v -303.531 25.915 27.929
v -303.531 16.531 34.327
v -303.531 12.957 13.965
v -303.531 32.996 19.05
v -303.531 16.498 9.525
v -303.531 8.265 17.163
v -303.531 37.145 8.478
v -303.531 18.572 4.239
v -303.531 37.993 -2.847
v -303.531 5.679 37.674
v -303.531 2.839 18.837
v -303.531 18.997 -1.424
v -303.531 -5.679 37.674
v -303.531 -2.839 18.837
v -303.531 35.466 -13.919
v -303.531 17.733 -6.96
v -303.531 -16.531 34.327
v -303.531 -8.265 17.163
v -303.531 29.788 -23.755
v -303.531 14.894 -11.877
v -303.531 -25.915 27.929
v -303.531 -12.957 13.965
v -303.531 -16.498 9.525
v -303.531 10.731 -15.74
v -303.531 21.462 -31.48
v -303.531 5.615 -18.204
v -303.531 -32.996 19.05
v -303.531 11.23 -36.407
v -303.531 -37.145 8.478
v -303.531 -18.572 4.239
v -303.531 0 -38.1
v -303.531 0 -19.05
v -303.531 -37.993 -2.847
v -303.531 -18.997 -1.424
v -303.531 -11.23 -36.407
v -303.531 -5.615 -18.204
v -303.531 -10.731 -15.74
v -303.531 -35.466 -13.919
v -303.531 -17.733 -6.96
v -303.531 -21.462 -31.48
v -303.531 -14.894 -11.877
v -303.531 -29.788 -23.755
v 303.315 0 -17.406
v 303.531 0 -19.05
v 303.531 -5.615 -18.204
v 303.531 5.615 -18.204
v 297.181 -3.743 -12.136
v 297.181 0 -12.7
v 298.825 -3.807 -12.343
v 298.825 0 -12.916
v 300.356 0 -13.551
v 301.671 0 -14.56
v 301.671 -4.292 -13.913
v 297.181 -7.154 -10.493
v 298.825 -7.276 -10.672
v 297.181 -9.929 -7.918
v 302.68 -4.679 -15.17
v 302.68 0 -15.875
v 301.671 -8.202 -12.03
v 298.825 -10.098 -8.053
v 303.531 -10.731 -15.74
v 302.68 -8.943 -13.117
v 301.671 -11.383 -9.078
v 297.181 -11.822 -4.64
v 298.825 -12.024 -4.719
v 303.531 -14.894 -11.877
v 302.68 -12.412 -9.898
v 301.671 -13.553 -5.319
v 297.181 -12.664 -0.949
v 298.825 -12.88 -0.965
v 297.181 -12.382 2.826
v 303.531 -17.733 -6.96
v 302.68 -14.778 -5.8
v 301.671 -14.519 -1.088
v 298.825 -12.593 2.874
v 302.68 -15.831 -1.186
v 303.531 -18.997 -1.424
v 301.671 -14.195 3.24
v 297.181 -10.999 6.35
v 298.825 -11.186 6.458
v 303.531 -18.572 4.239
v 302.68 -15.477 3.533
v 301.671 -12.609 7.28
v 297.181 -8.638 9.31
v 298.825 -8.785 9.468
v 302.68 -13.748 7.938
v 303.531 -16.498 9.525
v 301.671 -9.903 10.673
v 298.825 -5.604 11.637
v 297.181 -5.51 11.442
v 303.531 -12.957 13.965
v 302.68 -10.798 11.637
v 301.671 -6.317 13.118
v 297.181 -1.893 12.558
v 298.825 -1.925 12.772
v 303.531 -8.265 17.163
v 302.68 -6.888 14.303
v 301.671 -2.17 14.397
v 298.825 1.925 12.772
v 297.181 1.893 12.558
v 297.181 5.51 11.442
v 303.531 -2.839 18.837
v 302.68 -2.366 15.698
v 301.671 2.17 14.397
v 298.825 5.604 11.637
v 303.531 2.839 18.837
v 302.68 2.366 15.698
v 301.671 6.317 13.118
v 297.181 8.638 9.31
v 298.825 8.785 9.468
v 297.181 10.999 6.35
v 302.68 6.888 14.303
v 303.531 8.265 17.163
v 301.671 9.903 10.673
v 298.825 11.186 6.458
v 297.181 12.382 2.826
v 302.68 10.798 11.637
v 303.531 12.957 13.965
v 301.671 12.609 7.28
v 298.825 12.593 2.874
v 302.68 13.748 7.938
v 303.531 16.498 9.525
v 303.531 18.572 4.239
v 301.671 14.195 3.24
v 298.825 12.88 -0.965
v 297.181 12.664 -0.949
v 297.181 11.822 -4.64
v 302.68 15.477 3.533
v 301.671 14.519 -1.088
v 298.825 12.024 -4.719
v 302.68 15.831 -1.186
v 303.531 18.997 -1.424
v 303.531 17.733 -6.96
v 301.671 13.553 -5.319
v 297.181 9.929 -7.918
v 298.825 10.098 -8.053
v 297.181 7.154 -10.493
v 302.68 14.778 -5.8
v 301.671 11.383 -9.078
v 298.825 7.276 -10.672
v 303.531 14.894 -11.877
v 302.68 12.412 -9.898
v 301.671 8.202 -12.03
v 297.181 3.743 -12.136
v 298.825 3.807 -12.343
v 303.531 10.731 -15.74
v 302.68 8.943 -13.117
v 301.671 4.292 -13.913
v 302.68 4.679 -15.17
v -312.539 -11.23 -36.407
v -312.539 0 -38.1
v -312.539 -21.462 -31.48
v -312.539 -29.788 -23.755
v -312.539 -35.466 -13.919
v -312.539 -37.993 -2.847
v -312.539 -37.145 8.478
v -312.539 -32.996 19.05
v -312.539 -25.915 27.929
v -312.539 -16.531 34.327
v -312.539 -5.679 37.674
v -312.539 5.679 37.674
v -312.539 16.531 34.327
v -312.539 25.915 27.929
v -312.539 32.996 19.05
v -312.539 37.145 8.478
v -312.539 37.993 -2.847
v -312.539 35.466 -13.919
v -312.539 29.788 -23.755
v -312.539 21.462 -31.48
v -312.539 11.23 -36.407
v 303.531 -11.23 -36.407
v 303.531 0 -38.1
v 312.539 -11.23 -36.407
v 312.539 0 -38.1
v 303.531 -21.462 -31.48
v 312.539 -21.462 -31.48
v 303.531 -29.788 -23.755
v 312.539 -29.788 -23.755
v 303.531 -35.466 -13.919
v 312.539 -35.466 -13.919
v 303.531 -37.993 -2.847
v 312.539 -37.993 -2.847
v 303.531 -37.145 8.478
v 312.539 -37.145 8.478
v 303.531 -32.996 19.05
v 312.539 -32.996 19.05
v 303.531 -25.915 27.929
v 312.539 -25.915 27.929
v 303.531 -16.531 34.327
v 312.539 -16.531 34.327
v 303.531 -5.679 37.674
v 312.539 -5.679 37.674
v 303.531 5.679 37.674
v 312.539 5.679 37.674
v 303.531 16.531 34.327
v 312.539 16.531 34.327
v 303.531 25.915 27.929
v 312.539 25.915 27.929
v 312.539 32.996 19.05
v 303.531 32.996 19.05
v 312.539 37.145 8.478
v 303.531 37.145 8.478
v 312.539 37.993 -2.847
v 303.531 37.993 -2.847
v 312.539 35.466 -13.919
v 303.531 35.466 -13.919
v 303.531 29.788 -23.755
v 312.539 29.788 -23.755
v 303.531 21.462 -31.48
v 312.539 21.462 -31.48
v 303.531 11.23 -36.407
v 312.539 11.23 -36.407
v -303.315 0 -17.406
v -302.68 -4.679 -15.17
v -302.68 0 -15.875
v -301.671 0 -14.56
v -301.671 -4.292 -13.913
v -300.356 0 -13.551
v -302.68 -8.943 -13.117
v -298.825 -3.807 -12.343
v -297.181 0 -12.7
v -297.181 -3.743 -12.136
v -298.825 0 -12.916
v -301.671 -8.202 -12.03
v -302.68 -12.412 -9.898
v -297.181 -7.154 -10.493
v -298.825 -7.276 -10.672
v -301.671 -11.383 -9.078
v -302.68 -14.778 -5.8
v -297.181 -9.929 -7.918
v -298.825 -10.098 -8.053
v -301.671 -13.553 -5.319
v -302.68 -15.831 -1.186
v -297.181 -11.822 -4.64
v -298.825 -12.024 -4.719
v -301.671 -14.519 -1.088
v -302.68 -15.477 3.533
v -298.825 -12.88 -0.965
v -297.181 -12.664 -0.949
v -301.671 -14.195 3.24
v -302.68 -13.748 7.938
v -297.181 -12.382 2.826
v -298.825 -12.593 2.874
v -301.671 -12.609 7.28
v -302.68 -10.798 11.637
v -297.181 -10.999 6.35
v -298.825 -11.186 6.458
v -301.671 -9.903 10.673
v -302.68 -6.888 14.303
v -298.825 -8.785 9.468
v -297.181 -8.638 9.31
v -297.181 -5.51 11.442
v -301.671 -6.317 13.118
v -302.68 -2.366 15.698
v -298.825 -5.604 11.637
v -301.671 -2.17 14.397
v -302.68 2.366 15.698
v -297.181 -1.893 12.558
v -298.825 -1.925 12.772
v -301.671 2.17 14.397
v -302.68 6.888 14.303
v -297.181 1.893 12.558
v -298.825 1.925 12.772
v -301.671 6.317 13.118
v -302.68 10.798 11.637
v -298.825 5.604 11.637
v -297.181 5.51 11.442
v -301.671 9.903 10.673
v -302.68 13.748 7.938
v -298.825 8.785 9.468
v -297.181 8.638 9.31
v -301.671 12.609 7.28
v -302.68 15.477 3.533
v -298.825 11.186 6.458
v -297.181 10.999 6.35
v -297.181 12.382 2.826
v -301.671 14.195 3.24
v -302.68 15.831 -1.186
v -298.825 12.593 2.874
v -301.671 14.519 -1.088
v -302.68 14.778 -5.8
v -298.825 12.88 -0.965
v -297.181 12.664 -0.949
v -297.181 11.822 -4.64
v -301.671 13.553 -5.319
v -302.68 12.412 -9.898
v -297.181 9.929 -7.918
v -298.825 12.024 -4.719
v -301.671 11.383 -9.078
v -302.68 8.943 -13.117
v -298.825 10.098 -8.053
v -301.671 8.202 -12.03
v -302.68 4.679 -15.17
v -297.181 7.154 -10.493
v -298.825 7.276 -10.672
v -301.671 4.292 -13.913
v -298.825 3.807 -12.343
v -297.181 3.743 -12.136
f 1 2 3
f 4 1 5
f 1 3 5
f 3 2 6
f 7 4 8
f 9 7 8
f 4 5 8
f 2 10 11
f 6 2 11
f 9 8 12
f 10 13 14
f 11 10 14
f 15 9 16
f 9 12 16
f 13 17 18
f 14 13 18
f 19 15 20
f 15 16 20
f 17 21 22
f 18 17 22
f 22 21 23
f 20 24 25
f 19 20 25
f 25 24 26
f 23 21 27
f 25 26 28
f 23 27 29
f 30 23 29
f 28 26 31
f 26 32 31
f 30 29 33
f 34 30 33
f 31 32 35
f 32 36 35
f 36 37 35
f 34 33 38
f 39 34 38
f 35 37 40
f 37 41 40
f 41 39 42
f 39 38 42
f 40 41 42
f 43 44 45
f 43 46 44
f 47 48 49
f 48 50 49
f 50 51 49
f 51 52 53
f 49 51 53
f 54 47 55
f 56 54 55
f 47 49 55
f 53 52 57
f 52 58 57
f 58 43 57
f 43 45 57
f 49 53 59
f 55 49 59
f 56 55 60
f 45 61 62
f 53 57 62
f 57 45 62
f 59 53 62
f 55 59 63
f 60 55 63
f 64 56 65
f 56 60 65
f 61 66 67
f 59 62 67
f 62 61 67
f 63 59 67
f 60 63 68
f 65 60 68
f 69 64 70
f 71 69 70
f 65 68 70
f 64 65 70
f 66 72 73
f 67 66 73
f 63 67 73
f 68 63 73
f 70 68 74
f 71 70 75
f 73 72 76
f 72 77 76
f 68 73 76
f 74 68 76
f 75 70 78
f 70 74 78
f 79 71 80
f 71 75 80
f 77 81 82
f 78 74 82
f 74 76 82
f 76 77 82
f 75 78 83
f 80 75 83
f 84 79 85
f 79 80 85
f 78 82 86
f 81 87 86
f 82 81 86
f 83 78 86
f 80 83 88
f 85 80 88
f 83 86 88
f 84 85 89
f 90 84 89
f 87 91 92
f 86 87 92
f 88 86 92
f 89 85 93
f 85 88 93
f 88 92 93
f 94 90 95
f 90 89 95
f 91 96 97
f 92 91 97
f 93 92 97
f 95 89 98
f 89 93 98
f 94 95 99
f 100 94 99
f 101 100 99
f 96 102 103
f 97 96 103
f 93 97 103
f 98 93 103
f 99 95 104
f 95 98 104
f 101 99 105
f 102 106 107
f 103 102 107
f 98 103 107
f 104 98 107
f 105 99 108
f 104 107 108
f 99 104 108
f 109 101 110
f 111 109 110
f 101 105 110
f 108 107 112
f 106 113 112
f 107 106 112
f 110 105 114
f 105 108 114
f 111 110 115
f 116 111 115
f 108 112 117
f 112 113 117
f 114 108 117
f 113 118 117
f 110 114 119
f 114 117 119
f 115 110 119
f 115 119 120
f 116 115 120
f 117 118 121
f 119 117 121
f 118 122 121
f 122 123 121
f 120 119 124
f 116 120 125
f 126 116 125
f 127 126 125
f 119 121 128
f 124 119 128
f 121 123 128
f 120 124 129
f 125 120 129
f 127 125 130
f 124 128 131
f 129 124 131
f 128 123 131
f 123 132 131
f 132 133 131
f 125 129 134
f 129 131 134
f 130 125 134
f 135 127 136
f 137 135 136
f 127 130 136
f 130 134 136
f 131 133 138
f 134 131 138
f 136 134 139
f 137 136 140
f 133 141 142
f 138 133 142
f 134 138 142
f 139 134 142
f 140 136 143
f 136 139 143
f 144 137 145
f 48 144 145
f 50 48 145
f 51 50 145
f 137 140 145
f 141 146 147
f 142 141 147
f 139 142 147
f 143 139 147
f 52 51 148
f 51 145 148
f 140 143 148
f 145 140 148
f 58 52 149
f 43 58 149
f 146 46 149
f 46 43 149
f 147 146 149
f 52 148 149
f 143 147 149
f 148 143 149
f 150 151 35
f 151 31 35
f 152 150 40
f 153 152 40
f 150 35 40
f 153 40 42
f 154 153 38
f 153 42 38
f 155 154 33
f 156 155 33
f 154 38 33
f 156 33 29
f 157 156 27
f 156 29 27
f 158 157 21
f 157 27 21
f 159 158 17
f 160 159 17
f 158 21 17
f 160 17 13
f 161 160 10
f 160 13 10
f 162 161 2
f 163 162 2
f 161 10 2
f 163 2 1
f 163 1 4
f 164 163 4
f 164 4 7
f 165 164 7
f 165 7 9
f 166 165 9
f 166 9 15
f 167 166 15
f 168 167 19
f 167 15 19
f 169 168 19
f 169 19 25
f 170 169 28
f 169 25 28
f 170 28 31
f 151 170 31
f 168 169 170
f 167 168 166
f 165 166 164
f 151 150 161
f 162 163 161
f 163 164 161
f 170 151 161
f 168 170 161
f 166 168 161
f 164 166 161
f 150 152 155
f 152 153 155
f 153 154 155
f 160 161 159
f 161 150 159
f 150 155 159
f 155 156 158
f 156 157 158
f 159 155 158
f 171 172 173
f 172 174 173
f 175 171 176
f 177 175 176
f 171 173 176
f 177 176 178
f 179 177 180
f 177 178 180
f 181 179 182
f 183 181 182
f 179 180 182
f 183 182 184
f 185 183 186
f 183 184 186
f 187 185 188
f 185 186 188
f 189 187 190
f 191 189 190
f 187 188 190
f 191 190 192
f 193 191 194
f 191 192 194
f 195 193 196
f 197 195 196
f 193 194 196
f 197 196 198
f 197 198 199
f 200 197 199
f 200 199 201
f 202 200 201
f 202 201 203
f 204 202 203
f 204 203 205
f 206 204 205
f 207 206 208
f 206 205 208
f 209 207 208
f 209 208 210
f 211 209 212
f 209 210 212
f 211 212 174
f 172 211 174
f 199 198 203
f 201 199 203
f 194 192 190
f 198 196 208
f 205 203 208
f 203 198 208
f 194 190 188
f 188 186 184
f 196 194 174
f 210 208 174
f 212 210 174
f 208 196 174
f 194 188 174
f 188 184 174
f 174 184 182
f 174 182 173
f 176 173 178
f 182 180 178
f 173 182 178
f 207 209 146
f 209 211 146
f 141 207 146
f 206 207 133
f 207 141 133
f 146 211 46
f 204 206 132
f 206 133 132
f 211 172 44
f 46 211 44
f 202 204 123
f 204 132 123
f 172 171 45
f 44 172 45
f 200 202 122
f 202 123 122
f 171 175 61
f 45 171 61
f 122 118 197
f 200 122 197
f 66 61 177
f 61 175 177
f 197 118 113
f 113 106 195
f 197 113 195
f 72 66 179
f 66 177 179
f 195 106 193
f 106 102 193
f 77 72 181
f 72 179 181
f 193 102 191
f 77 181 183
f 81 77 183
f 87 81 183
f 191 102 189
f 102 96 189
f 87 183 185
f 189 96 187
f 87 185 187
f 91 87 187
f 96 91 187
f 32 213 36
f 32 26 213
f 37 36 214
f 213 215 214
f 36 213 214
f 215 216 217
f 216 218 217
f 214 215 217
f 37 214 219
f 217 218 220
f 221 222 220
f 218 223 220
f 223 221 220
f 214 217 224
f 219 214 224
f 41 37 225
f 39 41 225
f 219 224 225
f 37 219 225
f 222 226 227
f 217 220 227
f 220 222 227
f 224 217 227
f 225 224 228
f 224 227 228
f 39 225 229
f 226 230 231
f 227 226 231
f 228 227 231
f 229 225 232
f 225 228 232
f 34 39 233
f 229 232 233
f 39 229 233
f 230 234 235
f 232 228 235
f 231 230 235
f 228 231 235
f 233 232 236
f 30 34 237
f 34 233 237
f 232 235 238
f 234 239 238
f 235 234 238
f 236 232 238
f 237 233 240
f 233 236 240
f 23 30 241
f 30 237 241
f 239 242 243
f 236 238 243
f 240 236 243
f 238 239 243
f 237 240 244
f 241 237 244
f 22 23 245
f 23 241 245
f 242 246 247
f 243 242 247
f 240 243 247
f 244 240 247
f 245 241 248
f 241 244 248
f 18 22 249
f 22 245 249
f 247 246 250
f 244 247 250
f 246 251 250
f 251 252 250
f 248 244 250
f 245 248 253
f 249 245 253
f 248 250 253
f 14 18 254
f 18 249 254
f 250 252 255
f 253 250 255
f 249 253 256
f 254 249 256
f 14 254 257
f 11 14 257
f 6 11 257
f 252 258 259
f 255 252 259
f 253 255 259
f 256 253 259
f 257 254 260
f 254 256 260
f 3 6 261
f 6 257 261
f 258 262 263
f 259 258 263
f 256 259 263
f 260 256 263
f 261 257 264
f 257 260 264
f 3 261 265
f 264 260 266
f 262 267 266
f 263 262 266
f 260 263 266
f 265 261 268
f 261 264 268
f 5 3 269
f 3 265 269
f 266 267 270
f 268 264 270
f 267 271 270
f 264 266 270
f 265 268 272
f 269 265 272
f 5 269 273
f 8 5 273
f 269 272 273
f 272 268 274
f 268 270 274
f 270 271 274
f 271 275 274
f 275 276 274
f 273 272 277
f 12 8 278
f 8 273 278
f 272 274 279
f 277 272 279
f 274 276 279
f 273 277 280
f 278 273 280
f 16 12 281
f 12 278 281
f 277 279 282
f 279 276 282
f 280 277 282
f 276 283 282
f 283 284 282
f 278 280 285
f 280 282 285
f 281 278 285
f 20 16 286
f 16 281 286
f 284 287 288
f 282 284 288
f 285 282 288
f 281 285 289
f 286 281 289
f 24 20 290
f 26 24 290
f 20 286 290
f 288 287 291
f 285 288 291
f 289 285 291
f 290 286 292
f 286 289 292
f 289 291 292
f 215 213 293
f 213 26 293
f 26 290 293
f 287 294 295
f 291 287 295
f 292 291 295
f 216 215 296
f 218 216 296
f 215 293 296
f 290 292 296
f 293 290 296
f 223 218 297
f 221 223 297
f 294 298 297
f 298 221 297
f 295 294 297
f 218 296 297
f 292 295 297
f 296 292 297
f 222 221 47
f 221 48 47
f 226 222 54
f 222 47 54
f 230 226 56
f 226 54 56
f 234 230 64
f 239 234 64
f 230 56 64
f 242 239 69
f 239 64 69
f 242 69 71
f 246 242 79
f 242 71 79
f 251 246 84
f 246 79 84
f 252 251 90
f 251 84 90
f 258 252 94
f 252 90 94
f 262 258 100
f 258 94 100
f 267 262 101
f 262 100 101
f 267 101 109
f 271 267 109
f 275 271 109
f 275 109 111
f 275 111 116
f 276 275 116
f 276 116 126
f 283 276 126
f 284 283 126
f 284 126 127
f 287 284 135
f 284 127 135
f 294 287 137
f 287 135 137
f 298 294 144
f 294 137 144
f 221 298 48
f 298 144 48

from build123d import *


with BuildPart() as f1:
    # F0 (on Front) → F1 (revolve)
    with BuildSketch(Plane.XZ):
        with BuildLine():
            Line((0, -12.7), (0, 0))
            Line((0, 0), (-312.539067, 0))
            Line((-312.539067, 0), (-312.539067, -12.7))
            Line((-312.539067, -12.7), (-312.539067, -38.1))
            Line((-312.539067, -38.1), (-303.53117, -38.1))
            Line((-303.53117, -38.1), (-303.53117, -19.05))
            ThreePointArc((-303.53117, -19.05), (-301.671298, -14.559872), (-297.18117, -12.7))
            Line((-297.18117, -12.7), (0, -12.7))
        make_face()
        with BuildLine():
            Line((312.539067, 0), (0, 0))
            Line((0, 0), (0, -12.7))
            Line((0, -12.7), (297.18117, -12.7))
            ThreePointArc((297.18117, -12.7), (301.671298, -14.559872), (303.53117, -19.05))
            Line((303.53117, -19.05), (303.53117, -38.1))
            Line((303.53117, -38.1), (312.539067, -38.1))
            Line((312.539067, -38.1), (312.539067, -12.7))
            Line((312.539067, -12.7), (312.539067, 0))
        make_face()
    revolve(axis=Axis((-312.241406, 0, 0), (-1, 0, 0)))


solid = f1.part
